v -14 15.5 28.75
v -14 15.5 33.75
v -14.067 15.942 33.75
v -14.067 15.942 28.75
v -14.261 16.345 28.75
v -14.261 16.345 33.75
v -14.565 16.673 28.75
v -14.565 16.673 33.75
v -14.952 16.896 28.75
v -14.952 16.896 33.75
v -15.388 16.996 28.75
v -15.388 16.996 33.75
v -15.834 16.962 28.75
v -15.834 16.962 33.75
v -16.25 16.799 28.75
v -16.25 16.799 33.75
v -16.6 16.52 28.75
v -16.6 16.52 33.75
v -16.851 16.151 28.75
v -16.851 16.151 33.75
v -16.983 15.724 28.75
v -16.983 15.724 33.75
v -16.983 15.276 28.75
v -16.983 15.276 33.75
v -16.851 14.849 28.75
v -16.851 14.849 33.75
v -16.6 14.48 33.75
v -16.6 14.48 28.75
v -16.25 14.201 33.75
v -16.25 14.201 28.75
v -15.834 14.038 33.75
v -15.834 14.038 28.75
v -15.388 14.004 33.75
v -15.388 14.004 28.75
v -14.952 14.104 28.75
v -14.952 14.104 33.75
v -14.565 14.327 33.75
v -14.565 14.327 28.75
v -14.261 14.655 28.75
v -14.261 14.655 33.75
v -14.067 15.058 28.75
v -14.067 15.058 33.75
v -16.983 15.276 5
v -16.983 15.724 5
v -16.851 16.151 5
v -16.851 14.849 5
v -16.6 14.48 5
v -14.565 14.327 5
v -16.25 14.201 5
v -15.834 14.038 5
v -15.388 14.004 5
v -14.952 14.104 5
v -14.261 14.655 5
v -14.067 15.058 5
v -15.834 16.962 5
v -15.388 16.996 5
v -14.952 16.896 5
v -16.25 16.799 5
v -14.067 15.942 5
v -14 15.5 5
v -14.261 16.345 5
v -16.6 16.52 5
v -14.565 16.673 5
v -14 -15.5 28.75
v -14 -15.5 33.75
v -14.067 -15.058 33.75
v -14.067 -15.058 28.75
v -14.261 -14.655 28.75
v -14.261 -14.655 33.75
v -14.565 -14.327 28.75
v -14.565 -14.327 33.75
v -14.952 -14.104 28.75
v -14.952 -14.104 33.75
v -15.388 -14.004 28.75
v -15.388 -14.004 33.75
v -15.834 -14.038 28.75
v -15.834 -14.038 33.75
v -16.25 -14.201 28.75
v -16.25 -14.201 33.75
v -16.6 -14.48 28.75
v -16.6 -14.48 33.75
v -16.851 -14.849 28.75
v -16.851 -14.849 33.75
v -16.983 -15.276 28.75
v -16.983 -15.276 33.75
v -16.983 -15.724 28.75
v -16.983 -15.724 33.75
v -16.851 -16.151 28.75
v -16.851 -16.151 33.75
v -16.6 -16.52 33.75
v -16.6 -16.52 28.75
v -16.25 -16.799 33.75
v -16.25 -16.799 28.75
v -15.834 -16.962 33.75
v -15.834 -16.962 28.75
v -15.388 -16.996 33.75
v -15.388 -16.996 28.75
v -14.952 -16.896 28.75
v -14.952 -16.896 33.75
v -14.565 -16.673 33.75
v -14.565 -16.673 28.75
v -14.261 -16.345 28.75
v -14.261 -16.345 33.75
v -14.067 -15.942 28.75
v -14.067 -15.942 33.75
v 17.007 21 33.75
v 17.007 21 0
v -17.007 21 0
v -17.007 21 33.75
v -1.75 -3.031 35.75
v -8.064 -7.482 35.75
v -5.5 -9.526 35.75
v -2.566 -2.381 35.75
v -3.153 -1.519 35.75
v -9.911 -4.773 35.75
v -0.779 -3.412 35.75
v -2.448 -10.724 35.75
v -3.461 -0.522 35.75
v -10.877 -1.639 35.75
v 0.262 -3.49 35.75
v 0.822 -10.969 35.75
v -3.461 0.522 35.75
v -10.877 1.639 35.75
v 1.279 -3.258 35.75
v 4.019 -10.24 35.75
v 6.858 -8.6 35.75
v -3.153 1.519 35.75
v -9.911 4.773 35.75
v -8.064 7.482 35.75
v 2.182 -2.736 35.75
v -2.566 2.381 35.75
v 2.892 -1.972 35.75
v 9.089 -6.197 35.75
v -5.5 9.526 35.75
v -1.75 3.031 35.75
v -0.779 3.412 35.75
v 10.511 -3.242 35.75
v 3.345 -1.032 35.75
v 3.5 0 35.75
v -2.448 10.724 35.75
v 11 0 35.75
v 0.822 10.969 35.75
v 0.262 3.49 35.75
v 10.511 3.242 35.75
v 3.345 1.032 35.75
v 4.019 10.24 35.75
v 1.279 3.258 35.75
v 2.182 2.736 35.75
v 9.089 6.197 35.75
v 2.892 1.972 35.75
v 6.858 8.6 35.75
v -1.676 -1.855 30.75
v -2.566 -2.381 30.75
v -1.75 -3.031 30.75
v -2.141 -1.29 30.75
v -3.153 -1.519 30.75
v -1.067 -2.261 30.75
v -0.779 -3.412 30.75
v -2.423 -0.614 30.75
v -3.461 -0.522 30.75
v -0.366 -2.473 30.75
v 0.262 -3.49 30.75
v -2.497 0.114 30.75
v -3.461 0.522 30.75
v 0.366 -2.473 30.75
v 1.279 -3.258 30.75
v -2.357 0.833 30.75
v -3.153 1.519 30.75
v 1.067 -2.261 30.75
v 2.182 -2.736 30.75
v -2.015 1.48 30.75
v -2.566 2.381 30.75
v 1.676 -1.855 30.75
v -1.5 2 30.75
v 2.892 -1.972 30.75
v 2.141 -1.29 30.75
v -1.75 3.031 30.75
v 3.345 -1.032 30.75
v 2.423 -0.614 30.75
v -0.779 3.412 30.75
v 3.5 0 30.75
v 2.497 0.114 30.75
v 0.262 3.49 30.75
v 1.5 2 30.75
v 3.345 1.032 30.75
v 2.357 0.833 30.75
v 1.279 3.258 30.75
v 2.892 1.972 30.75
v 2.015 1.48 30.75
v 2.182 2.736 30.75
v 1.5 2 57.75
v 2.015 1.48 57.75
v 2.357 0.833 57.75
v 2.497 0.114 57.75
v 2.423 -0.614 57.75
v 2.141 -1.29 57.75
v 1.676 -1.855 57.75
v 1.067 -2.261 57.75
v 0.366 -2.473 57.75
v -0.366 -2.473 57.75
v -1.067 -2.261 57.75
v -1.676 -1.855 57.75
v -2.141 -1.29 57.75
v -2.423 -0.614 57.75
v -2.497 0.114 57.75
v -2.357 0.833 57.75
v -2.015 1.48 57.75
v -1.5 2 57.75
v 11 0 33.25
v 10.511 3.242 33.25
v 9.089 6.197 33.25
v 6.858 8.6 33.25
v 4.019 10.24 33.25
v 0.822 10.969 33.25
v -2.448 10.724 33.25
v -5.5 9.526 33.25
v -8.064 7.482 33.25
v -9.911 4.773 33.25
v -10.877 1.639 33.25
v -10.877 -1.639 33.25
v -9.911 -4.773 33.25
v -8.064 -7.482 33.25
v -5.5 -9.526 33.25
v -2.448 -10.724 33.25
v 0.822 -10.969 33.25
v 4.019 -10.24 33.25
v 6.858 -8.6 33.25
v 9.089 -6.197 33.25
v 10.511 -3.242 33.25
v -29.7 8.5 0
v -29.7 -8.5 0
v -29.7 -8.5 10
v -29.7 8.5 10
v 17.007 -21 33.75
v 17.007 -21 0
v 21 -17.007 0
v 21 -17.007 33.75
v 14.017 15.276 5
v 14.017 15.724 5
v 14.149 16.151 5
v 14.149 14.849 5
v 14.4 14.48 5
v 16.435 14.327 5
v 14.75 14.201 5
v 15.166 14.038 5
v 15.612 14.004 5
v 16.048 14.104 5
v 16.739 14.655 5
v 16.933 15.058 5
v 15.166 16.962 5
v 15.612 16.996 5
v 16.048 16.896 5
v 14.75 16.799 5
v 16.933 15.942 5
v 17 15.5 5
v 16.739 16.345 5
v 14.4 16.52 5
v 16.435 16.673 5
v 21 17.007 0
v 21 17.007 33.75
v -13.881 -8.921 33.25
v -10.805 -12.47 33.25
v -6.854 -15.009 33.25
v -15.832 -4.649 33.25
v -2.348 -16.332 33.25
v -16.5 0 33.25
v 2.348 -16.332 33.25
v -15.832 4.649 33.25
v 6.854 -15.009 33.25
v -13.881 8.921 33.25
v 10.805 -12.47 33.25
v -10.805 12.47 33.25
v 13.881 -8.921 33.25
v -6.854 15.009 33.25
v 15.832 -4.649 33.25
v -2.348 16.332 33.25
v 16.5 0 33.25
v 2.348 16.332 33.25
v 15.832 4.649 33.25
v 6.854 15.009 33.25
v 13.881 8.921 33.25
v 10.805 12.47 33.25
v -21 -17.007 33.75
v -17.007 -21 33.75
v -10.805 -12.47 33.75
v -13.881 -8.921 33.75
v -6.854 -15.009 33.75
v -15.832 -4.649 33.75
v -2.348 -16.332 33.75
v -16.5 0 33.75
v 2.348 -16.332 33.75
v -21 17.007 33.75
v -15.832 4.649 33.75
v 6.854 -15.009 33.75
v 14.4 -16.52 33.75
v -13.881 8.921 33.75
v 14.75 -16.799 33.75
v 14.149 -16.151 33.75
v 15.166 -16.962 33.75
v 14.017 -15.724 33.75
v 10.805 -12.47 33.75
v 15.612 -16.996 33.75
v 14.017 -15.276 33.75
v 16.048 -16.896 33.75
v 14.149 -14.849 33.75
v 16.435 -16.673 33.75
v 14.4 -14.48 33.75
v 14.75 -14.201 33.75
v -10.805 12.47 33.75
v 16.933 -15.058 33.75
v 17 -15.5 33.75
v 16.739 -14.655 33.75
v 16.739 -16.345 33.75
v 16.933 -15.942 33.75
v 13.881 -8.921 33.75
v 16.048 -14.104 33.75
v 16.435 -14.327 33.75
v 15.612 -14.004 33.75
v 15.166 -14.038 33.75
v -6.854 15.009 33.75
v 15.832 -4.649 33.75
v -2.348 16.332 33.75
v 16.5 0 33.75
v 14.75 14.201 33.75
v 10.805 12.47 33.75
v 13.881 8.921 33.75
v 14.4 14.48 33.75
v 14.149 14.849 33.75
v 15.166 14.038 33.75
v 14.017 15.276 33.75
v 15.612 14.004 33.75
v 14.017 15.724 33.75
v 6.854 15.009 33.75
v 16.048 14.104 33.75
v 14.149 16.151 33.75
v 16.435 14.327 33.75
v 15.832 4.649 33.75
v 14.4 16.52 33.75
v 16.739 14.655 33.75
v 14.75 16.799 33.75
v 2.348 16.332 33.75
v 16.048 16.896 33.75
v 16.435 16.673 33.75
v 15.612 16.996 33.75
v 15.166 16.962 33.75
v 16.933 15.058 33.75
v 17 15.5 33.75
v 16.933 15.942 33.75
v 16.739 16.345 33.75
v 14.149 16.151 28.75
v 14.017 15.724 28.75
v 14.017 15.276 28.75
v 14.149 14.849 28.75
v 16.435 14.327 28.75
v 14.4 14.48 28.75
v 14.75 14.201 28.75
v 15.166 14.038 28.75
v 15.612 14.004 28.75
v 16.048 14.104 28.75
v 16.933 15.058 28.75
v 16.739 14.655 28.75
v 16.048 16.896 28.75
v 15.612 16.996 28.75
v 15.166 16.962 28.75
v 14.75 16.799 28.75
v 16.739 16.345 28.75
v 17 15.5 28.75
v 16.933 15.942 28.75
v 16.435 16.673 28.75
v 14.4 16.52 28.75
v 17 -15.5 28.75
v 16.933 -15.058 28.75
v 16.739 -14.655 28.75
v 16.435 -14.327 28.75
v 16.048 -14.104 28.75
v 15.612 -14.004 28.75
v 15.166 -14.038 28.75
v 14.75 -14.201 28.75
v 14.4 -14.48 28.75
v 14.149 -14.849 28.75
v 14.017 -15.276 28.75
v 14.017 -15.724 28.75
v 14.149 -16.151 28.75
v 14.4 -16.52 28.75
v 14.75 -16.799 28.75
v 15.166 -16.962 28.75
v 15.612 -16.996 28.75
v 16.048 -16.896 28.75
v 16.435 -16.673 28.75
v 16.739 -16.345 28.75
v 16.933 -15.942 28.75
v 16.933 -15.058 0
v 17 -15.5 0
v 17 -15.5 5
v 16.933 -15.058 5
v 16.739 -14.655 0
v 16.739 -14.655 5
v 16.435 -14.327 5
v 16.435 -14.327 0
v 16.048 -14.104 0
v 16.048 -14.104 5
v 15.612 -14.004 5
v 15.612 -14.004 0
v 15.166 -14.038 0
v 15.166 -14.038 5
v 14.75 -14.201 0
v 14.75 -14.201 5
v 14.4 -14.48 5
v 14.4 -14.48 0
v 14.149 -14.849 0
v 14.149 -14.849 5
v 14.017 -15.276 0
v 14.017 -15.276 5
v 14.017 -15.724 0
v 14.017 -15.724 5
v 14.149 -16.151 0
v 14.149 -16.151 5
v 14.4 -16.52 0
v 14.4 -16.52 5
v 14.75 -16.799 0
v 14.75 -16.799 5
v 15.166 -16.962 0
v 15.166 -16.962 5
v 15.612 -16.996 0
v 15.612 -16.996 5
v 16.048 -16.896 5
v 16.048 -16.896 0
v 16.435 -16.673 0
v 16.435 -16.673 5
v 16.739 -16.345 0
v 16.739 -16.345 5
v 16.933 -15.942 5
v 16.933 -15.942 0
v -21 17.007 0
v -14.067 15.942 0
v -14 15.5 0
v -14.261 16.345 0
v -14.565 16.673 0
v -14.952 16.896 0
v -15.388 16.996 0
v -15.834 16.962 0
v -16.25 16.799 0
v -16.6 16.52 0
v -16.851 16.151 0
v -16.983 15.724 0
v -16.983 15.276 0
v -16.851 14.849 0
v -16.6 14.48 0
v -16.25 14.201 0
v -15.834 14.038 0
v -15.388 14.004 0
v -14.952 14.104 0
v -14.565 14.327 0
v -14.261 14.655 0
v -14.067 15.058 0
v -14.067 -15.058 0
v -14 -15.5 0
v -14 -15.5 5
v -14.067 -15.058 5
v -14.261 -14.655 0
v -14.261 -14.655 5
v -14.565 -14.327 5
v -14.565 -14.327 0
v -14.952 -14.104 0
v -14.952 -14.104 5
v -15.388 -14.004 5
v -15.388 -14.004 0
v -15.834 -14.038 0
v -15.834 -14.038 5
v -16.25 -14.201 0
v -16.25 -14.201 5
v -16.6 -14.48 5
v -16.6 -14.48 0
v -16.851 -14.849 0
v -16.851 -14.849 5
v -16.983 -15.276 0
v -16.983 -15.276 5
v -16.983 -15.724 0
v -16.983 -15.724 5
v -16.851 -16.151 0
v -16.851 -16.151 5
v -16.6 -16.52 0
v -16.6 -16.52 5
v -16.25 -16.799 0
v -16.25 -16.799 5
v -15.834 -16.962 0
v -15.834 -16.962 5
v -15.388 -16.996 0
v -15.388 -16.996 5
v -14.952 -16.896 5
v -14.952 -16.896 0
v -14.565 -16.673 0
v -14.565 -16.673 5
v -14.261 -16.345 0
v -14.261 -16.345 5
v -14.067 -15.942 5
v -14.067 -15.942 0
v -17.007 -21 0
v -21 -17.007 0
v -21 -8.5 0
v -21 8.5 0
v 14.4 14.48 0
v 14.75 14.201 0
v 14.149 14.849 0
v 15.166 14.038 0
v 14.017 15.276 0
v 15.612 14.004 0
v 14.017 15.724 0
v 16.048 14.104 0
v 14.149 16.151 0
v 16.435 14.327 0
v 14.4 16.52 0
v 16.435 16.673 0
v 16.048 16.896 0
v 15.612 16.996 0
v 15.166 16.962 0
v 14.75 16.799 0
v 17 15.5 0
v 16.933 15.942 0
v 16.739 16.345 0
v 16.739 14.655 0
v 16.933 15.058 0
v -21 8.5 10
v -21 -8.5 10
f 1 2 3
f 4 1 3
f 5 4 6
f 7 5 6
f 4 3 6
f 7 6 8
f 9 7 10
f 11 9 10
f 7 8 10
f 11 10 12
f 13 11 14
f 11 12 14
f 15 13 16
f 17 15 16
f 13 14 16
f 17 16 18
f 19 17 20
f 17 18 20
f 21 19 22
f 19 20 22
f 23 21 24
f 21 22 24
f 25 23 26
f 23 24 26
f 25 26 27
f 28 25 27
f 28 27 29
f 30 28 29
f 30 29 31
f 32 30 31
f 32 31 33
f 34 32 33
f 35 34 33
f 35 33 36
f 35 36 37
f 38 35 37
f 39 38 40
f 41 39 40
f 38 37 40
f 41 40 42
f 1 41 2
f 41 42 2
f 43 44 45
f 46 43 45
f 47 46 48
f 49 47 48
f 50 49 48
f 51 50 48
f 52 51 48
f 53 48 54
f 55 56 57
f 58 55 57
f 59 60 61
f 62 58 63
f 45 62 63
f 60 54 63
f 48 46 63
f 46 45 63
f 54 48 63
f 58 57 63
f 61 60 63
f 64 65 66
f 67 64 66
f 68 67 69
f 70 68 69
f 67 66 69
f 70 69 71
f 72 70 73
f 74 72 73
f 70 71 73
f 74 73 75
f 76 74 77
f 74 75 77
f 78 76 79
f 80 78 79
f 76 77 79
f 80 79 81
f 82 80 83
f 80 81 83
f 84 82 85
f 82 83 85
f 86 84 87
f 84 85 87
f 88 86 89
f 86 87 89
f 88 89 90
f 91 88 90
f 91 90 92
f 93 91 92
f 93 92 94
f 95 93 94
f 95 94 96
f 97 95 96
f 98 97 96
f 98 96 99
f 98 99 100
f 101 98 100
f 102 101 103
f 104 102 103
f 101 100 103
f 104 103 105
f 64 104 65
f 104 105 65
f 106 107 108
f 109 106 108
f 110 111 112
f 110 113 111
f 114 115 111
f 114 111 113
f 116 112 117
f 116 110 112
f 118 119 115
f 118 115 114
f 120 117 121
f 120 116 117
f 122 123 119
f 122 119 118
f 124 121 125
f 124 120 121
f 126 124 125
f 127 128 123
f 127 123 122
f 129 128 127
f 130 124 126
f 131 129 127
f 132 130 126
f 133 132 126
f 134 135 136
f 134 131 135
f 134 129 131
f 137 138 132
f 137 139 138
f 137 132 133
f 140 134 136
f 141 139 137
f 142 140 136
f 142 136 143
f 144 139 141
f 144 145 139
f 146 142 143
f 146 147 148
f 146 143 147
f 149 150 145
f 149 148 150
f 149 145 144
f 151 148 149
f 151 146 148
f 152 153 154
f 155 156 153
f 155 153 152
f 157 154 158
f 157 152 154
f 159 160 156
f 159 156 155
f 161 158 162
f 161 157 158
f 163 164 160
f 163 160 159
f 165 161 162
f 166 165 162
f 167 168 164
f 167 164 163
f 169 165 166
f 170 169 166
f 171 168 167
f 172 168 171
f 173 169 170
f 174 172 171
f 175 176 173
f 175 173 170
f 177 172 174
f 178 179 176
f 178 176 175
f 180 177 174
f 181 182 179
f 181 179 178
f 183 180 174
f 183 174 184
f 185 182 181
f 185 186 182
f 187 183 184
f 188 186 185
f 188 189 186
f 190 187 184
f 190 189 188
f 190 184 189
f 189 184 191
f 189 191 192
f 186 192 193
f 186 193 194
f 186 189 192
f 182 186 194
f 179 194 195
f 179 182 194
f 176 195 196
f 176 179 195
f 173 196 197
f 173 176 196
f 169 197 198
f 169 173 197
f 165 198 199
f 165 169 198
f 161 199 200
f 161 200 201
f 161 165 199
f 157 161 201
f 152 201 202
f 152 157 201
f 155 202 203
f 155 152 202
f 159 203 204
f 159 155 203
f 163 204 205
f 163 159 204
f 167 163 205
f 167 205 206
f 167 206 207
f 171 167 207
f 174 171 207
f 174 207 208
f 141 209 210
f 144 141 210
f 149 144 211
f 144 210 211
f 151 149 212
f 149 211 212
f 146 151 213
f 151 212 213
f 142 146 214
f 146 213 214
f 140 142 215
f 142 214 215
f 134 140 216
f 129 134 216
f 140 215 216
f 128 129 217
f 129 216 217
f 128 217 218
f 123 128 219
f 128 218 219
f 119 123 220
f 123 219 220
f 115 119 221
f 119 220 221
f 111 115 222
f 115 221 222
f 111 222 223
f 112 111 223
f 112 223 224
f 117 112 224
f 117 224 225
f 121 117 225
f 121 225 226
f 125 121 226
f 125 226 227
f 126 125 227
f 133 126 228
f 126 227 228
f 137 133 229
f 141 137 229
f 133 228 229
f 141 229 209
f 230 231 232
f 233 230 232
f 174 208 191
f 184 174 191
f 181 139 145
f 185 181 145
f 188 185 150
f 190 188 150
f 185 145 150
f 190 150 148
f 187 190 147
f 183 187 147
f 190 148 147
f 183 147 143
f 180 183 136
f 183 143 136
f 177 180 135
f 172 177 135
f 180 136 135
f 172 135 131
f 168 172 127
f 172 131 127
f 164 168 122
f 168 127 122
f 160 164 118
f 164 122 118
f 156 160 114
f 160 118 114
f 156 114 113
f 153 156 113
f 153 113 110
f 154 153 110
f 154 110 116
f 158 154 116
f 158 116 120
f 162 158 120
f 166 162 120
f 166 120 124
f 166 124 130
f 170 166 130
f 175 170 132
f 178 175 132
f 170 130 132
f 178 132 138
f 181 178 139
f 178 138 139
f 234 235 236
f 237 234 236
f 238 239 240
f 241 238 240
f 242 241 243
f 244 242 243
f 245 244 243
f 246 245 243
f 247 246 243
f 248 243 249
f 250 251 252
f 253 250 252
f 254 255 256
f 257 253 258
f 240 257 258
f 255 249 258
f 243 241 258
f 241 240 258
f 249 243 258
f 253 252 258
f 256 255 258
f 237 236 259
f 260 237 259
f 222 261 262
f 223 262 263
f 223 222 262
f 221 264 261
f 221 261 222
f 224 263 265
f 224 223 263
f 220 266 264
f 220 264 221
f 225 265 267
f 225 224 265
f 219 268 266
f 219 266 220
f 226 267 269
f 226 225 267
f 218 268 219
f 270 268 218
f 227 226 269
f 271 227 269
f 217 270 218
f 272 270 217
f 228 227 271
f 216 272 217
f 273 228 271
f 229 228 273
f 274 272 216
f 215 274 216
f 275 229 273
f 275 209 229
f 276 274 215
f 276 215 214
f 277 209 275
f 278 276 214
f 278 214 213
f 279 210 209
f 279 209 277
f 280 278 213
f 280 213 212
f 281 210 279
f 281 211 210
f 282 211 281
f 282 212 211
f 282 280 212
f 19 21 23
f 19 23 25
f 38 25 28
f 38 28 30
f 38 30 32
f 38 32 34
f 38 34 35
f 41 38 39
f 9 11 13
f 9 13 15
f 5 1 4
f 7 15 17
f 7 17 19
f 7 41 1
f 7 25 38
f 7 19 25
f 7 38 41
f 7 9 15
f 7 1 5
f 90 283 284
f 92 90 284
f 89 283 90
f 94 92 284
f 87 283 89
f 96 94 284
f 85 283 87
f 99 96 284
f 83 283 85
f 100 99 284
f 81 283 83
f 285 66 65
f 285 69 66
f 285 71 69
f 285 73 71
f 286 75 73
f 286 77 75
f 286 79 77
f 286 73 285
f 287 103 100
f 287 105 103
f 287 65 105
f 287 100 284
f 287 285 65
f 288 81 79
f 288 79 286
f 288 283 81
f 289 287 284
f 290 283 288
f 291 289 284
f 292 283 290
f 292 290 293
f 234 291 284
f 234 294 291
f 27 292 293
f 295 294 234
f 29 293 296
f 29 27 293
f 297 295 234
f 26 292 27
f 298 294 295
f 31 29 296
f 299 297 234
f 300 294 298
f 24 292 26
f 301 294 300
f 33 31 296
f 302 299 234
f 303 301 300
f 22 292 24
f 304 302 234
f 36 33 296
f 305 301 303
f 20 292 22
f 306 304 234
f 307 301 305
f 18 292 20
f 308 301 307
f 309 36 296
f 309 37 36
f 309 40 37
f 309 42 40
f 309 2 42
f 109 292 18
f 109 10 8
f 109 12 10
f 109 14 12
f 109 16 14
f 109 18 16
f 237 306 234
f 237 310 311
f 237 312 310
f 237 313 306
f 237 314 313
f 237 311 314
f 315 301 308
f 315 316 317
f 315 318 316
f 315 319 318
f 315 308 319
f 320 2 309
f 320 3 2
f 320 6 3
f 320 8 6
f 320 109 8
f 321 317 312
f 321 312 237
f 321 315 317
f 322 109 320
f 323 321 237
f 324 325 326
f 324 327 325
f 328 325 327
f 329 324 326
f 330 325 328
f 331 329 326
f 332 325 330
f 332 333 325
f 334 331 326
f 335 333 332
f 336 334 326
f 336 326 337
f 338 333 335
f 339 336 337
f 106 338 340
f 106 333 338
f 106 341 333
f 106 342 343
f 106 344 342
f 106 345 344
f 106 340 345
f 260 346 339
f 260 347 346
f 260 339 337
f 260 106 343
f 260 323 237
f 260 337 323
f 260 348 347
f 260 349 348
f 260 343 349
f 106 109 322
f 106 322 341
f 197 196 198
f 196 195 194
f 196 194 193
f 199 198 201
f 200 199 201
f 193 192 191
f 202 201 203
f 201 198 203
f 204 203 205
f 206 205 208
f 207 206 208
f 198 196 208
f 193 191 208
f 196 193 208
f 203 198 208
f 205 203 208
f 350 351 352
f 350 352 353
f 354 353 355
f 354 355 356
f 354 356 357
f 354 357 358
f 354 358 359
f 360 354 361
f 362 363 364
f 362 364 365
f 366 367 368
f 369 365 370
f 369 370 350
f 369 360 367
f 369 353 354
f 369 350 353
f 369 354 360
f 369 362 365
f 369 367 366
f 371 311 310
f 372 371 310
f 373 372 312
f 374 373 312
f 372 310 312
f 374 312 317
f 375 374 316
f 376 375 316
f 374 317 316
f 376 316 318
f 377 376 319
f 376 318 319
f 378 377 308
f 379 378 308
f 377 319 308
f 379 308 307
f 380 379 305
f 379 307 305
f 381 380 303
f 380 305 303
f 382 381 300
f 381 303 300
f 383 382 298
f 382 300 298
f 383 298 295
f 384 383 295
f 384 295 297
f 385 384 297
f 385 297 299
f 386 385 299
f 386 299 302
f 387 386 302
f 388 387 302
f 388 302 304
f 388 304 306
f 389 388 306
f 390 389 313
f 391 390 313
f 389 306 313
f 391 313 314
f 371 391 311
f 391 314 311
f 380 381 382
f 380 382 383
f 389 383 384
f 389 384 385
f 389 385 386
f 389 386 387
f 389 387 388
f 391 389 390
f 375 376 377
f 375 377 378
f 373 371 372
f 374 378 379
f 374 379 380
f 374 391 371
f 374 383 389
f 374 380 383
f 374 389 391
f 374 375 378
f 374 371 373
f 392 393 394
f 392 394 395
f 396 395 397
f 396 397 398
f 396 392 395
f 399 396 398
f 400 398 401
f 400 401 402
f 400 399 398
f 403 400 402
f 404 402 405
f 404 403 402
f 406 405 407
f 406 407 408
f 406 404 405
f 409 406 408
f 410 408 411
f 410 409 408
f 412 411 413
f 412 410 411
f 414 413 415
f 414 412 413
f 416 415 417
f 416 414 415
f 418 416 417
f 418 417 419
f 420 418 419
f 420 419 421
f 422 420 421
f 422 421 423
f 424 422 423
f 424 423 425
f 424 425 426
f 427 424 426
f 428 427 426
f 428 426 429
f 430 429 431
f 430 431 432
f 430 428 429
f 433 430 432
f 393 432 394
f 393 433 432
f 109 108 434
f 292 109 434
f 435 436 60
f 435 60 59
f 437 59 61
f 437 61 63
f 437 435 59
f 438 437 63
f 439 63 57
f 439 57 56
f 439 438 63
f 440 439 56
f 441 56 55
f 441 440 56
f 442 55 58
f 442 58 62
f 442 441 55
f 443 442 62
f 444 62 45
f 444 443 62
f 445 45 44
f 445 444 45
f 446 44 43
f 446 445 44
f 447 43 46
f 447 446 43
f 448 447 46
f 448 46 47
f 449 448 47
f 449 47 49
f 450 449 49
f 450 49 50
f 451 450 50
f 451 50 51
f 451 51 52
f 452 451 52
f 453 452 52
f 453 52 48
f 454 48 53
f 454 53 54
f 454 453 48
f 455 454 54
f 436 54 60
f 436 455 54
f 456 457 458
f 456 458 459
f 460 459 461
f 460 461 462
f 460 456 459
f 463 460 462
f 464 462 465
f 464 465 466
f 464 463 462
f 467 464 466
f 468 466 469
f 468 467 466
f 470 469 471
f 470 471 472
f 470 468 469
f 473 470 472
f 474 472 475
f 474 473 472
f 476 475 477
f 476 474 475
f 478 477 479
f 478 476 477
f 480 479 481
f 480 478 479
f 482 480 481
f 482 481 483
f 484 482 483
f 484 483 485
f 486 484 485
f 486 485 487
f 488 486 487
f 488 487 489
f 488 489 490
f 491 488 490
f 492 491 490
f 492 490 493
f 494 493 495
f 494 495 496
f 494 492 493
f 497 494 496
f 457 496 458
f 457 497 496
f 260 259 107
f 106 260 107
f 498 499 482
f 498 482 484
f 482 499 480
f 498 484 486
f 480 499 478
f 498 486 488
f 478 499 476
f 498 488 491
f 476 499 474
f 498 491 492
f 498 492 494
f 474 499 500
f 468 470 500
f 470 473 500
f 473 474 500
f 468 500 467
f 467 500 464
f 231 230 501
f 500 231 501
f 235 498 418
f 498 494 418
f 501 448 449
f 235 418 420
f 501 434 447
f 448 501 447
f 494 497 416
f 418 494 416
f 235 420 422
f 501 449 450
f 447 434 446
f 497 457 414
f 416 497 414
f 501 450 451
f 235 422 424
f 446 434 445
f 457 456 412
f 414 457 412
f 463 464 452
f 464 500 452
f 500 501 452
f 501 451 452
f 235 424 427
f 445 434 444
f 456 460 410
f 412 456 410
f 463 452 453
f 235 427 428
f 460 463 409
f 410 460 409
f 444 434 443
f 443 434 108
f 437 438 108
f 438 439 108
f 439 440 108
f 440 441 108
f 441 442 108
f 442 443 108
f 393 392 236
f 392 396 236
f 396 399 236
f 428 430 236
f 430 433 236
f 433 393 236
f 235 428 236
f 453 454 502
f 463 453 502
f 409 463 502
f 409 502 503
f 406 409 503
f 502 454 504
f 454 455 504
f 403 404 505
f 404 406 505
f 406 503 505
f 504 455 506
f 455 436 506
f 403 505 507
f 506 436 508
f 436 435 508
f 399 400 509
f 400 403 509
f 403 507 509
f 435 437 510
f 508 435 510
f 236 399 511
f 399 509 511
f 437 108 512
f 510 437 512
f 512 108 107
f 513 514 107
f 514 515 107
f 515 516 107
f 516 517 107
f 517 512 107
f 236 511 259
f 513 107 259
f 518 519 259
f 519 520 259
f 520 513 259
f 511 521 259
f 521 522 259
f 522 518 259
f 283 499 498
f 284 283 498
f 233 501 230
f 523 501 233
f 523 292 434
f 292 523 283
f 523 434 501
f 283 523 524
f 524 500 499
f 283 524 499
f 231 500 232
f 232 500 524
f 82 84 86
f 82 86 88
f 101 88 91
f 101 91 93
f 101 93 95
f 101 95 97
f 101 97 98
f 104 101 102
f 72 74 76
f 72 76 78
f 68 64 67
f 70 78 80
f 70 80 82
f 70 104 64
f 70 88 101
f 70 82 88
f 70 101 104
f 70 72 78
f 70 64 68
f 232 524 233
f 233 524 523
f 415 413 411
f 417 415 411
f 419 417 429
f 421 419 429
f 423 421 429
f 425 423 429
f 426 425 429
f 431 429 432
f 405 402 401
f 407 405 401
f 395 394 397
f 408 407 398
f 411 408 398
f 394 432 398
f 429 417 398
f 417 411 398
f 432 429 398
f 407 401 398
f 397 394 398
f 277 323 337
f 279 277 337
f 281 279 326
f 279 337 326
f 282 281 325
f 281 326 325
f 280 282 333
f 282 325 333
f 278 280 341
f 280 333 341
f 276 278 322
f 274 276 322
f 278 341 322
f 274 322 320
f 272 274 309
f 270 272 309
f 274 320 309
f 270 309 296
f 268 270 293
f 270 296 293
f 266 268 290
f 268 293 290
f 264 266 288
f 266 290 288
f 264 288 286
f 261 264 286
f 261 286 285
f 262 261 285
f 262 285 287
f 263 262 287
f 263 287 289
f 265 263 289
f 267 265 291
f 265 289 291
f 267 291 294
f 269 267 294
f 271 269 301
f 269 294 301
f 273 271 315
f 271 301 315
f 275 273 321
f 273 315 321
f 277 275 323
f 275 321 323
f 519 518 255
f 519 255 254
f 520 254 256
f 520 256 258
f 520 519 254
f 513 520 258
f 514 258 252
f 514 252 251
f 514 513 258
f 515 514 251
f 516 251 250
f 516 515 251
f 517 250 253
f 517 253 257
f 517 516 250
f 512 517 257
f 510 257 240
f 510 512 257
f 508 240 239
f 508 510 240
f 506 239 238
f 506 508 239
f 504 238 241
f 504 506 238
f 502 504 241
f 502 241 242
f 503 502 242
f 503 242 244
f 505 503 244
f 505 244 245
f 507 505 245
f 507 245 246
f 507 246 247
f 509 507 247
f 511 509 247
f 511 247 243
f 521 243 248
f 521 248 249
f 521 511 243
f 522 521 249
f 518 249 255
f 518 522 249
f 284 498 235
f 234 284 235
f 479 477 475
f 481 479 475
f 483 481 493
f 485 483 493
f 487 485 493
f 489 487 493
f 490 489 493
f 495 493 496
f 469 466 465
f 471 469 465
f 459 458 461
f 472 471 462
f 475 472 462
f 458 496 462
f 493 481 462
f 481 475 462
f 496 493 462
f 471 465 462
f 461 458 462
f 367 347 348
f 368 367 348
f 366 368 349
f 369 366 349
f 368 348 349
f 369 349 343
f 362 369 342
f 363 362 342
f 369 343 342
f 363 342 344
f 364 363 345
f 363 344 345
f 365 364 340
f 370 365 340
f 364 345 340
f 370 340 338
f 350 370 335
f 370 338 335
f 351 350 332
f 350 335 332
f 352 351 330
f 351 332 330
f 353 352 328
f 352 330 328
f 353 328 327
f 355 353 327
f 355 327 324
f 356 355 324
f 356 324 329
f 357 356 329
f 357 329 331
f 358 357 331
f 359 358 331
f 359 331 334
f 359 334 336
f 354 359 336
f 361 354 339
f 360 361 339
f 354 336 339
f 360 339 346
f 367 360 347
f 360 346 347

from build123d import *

# Parameters (mm, degrees)
BOSS_EXTRUDE1_DEPTH = 33.75
SKETCH2_R           = 16.5
CUT_EXTRUDE1_DEPTH  = 0.5
SKETCH3_R           = 11
BOSS_EXTRUDE2_DEPTH = 2.5
SKETCH4_R           = 3.5
CUT_EXTRUDE2_DEPTH  = 5
BOSS_EXTRUDE3_DEPTH = 27
SKETCH6_R           = 1.5
CUT_EXTRUDE3_DEPTH  = 5
SKETCH7_W           = 10
SKETCH7_H           = 17
BOSS_EXTRUDE4_DEPTH = 8.7


with BuildPart() as part:
    # Sketch1 → Boss-Extrude1 (new body)
    with BuildSketch(Plane.XY):
        Polygon((-17.006989489, 21), (-21, 17.006989489), (-21, -17.006989489), (-17.006989489, -21), (17.006989489, -21), (21, -17.006989489), (21, 17.006989489), (17.006989489, 21), align=None)
    extrude(amount=BOSS_EXTRUDE1_DEPTH)

    # Sketch2 → Cut-Extrude1 (cut)
    with BuildSketch(Plane.XY.offset(33.75)):
        Circle(SKETCH2_R)
    extrude(amount=-CUT_EXTRUDE1_DEPTH, mode=Mode.SUBTRACT)

    # Sketch3 → Boss-Extrude2 (add)
    with BuildSketch(Plane.XY.offset(33.25)):
        Circle(SKETCH3_R)
    extrude(amount=BOSS_EXTRUDE2_DEPTH)

    # Sketch4 → Cut-Extrude2 (cut)
    with BuildSketch(Plane.XY.offset(35.75)):
        Circle(SKETCH4_R)
    extrude(amount=-CUT_EXTRUDE2_DEPTH, mode=Mode.SUBTRACT)

    # Sketch5 → Boss-Extrude3 (add)
    with BuildSketch(Plane.XY.offset(30.75)):
        with BuildLine():
            Line((-1.5, 2), (1.5, 2))
            ThreePointArc((1.5, 2), (0, -2.5), (-1.5, 2))
        make_face()
    extrude(amount=BOSS_EXTRUDE3_DEPTH)

    # Sketch6 → Cut-Extrude3 (cut)
    with BuildSketch(Plane.XY.offset(33.75)):
        with Locations((-15.5, 15.5)):
            Circle(SKETCH6_R)
        with Locations((15.5, 15.5)):
            Circle(SKETCH6_R)
        with Locations((15.5, -15.5)):
            Circle(SKETCH6_R)
        with Locations((-15.5, -15.5)):
            Circle(SKETCH6_R)
    cut_extrude3 = extrude(amount=-CUT_EXTRUDE3_DEPTH, mode=Mode.SUBTRACT)

    # Mirror1: Cut-Extrude3 across plane
    add(cut_extrude3.mirror(Plane(origin=(0, 0, 16.875), x_dir=(1, 0, 0), z_dir=(0, 0, -1))), mode=Mode.SUBTRACT)

    # Sketch7 → Boss-Extrude4 (add)
    with BuildSketch(Plane.ZY.offset(21)):
        with Locations((5, 0)):
            Rectangle(SKETCH7_W, SKETCH7_H)
    extrude(amount=BOSS_EXTRUDE4_DEPTH)


solid = part.part
